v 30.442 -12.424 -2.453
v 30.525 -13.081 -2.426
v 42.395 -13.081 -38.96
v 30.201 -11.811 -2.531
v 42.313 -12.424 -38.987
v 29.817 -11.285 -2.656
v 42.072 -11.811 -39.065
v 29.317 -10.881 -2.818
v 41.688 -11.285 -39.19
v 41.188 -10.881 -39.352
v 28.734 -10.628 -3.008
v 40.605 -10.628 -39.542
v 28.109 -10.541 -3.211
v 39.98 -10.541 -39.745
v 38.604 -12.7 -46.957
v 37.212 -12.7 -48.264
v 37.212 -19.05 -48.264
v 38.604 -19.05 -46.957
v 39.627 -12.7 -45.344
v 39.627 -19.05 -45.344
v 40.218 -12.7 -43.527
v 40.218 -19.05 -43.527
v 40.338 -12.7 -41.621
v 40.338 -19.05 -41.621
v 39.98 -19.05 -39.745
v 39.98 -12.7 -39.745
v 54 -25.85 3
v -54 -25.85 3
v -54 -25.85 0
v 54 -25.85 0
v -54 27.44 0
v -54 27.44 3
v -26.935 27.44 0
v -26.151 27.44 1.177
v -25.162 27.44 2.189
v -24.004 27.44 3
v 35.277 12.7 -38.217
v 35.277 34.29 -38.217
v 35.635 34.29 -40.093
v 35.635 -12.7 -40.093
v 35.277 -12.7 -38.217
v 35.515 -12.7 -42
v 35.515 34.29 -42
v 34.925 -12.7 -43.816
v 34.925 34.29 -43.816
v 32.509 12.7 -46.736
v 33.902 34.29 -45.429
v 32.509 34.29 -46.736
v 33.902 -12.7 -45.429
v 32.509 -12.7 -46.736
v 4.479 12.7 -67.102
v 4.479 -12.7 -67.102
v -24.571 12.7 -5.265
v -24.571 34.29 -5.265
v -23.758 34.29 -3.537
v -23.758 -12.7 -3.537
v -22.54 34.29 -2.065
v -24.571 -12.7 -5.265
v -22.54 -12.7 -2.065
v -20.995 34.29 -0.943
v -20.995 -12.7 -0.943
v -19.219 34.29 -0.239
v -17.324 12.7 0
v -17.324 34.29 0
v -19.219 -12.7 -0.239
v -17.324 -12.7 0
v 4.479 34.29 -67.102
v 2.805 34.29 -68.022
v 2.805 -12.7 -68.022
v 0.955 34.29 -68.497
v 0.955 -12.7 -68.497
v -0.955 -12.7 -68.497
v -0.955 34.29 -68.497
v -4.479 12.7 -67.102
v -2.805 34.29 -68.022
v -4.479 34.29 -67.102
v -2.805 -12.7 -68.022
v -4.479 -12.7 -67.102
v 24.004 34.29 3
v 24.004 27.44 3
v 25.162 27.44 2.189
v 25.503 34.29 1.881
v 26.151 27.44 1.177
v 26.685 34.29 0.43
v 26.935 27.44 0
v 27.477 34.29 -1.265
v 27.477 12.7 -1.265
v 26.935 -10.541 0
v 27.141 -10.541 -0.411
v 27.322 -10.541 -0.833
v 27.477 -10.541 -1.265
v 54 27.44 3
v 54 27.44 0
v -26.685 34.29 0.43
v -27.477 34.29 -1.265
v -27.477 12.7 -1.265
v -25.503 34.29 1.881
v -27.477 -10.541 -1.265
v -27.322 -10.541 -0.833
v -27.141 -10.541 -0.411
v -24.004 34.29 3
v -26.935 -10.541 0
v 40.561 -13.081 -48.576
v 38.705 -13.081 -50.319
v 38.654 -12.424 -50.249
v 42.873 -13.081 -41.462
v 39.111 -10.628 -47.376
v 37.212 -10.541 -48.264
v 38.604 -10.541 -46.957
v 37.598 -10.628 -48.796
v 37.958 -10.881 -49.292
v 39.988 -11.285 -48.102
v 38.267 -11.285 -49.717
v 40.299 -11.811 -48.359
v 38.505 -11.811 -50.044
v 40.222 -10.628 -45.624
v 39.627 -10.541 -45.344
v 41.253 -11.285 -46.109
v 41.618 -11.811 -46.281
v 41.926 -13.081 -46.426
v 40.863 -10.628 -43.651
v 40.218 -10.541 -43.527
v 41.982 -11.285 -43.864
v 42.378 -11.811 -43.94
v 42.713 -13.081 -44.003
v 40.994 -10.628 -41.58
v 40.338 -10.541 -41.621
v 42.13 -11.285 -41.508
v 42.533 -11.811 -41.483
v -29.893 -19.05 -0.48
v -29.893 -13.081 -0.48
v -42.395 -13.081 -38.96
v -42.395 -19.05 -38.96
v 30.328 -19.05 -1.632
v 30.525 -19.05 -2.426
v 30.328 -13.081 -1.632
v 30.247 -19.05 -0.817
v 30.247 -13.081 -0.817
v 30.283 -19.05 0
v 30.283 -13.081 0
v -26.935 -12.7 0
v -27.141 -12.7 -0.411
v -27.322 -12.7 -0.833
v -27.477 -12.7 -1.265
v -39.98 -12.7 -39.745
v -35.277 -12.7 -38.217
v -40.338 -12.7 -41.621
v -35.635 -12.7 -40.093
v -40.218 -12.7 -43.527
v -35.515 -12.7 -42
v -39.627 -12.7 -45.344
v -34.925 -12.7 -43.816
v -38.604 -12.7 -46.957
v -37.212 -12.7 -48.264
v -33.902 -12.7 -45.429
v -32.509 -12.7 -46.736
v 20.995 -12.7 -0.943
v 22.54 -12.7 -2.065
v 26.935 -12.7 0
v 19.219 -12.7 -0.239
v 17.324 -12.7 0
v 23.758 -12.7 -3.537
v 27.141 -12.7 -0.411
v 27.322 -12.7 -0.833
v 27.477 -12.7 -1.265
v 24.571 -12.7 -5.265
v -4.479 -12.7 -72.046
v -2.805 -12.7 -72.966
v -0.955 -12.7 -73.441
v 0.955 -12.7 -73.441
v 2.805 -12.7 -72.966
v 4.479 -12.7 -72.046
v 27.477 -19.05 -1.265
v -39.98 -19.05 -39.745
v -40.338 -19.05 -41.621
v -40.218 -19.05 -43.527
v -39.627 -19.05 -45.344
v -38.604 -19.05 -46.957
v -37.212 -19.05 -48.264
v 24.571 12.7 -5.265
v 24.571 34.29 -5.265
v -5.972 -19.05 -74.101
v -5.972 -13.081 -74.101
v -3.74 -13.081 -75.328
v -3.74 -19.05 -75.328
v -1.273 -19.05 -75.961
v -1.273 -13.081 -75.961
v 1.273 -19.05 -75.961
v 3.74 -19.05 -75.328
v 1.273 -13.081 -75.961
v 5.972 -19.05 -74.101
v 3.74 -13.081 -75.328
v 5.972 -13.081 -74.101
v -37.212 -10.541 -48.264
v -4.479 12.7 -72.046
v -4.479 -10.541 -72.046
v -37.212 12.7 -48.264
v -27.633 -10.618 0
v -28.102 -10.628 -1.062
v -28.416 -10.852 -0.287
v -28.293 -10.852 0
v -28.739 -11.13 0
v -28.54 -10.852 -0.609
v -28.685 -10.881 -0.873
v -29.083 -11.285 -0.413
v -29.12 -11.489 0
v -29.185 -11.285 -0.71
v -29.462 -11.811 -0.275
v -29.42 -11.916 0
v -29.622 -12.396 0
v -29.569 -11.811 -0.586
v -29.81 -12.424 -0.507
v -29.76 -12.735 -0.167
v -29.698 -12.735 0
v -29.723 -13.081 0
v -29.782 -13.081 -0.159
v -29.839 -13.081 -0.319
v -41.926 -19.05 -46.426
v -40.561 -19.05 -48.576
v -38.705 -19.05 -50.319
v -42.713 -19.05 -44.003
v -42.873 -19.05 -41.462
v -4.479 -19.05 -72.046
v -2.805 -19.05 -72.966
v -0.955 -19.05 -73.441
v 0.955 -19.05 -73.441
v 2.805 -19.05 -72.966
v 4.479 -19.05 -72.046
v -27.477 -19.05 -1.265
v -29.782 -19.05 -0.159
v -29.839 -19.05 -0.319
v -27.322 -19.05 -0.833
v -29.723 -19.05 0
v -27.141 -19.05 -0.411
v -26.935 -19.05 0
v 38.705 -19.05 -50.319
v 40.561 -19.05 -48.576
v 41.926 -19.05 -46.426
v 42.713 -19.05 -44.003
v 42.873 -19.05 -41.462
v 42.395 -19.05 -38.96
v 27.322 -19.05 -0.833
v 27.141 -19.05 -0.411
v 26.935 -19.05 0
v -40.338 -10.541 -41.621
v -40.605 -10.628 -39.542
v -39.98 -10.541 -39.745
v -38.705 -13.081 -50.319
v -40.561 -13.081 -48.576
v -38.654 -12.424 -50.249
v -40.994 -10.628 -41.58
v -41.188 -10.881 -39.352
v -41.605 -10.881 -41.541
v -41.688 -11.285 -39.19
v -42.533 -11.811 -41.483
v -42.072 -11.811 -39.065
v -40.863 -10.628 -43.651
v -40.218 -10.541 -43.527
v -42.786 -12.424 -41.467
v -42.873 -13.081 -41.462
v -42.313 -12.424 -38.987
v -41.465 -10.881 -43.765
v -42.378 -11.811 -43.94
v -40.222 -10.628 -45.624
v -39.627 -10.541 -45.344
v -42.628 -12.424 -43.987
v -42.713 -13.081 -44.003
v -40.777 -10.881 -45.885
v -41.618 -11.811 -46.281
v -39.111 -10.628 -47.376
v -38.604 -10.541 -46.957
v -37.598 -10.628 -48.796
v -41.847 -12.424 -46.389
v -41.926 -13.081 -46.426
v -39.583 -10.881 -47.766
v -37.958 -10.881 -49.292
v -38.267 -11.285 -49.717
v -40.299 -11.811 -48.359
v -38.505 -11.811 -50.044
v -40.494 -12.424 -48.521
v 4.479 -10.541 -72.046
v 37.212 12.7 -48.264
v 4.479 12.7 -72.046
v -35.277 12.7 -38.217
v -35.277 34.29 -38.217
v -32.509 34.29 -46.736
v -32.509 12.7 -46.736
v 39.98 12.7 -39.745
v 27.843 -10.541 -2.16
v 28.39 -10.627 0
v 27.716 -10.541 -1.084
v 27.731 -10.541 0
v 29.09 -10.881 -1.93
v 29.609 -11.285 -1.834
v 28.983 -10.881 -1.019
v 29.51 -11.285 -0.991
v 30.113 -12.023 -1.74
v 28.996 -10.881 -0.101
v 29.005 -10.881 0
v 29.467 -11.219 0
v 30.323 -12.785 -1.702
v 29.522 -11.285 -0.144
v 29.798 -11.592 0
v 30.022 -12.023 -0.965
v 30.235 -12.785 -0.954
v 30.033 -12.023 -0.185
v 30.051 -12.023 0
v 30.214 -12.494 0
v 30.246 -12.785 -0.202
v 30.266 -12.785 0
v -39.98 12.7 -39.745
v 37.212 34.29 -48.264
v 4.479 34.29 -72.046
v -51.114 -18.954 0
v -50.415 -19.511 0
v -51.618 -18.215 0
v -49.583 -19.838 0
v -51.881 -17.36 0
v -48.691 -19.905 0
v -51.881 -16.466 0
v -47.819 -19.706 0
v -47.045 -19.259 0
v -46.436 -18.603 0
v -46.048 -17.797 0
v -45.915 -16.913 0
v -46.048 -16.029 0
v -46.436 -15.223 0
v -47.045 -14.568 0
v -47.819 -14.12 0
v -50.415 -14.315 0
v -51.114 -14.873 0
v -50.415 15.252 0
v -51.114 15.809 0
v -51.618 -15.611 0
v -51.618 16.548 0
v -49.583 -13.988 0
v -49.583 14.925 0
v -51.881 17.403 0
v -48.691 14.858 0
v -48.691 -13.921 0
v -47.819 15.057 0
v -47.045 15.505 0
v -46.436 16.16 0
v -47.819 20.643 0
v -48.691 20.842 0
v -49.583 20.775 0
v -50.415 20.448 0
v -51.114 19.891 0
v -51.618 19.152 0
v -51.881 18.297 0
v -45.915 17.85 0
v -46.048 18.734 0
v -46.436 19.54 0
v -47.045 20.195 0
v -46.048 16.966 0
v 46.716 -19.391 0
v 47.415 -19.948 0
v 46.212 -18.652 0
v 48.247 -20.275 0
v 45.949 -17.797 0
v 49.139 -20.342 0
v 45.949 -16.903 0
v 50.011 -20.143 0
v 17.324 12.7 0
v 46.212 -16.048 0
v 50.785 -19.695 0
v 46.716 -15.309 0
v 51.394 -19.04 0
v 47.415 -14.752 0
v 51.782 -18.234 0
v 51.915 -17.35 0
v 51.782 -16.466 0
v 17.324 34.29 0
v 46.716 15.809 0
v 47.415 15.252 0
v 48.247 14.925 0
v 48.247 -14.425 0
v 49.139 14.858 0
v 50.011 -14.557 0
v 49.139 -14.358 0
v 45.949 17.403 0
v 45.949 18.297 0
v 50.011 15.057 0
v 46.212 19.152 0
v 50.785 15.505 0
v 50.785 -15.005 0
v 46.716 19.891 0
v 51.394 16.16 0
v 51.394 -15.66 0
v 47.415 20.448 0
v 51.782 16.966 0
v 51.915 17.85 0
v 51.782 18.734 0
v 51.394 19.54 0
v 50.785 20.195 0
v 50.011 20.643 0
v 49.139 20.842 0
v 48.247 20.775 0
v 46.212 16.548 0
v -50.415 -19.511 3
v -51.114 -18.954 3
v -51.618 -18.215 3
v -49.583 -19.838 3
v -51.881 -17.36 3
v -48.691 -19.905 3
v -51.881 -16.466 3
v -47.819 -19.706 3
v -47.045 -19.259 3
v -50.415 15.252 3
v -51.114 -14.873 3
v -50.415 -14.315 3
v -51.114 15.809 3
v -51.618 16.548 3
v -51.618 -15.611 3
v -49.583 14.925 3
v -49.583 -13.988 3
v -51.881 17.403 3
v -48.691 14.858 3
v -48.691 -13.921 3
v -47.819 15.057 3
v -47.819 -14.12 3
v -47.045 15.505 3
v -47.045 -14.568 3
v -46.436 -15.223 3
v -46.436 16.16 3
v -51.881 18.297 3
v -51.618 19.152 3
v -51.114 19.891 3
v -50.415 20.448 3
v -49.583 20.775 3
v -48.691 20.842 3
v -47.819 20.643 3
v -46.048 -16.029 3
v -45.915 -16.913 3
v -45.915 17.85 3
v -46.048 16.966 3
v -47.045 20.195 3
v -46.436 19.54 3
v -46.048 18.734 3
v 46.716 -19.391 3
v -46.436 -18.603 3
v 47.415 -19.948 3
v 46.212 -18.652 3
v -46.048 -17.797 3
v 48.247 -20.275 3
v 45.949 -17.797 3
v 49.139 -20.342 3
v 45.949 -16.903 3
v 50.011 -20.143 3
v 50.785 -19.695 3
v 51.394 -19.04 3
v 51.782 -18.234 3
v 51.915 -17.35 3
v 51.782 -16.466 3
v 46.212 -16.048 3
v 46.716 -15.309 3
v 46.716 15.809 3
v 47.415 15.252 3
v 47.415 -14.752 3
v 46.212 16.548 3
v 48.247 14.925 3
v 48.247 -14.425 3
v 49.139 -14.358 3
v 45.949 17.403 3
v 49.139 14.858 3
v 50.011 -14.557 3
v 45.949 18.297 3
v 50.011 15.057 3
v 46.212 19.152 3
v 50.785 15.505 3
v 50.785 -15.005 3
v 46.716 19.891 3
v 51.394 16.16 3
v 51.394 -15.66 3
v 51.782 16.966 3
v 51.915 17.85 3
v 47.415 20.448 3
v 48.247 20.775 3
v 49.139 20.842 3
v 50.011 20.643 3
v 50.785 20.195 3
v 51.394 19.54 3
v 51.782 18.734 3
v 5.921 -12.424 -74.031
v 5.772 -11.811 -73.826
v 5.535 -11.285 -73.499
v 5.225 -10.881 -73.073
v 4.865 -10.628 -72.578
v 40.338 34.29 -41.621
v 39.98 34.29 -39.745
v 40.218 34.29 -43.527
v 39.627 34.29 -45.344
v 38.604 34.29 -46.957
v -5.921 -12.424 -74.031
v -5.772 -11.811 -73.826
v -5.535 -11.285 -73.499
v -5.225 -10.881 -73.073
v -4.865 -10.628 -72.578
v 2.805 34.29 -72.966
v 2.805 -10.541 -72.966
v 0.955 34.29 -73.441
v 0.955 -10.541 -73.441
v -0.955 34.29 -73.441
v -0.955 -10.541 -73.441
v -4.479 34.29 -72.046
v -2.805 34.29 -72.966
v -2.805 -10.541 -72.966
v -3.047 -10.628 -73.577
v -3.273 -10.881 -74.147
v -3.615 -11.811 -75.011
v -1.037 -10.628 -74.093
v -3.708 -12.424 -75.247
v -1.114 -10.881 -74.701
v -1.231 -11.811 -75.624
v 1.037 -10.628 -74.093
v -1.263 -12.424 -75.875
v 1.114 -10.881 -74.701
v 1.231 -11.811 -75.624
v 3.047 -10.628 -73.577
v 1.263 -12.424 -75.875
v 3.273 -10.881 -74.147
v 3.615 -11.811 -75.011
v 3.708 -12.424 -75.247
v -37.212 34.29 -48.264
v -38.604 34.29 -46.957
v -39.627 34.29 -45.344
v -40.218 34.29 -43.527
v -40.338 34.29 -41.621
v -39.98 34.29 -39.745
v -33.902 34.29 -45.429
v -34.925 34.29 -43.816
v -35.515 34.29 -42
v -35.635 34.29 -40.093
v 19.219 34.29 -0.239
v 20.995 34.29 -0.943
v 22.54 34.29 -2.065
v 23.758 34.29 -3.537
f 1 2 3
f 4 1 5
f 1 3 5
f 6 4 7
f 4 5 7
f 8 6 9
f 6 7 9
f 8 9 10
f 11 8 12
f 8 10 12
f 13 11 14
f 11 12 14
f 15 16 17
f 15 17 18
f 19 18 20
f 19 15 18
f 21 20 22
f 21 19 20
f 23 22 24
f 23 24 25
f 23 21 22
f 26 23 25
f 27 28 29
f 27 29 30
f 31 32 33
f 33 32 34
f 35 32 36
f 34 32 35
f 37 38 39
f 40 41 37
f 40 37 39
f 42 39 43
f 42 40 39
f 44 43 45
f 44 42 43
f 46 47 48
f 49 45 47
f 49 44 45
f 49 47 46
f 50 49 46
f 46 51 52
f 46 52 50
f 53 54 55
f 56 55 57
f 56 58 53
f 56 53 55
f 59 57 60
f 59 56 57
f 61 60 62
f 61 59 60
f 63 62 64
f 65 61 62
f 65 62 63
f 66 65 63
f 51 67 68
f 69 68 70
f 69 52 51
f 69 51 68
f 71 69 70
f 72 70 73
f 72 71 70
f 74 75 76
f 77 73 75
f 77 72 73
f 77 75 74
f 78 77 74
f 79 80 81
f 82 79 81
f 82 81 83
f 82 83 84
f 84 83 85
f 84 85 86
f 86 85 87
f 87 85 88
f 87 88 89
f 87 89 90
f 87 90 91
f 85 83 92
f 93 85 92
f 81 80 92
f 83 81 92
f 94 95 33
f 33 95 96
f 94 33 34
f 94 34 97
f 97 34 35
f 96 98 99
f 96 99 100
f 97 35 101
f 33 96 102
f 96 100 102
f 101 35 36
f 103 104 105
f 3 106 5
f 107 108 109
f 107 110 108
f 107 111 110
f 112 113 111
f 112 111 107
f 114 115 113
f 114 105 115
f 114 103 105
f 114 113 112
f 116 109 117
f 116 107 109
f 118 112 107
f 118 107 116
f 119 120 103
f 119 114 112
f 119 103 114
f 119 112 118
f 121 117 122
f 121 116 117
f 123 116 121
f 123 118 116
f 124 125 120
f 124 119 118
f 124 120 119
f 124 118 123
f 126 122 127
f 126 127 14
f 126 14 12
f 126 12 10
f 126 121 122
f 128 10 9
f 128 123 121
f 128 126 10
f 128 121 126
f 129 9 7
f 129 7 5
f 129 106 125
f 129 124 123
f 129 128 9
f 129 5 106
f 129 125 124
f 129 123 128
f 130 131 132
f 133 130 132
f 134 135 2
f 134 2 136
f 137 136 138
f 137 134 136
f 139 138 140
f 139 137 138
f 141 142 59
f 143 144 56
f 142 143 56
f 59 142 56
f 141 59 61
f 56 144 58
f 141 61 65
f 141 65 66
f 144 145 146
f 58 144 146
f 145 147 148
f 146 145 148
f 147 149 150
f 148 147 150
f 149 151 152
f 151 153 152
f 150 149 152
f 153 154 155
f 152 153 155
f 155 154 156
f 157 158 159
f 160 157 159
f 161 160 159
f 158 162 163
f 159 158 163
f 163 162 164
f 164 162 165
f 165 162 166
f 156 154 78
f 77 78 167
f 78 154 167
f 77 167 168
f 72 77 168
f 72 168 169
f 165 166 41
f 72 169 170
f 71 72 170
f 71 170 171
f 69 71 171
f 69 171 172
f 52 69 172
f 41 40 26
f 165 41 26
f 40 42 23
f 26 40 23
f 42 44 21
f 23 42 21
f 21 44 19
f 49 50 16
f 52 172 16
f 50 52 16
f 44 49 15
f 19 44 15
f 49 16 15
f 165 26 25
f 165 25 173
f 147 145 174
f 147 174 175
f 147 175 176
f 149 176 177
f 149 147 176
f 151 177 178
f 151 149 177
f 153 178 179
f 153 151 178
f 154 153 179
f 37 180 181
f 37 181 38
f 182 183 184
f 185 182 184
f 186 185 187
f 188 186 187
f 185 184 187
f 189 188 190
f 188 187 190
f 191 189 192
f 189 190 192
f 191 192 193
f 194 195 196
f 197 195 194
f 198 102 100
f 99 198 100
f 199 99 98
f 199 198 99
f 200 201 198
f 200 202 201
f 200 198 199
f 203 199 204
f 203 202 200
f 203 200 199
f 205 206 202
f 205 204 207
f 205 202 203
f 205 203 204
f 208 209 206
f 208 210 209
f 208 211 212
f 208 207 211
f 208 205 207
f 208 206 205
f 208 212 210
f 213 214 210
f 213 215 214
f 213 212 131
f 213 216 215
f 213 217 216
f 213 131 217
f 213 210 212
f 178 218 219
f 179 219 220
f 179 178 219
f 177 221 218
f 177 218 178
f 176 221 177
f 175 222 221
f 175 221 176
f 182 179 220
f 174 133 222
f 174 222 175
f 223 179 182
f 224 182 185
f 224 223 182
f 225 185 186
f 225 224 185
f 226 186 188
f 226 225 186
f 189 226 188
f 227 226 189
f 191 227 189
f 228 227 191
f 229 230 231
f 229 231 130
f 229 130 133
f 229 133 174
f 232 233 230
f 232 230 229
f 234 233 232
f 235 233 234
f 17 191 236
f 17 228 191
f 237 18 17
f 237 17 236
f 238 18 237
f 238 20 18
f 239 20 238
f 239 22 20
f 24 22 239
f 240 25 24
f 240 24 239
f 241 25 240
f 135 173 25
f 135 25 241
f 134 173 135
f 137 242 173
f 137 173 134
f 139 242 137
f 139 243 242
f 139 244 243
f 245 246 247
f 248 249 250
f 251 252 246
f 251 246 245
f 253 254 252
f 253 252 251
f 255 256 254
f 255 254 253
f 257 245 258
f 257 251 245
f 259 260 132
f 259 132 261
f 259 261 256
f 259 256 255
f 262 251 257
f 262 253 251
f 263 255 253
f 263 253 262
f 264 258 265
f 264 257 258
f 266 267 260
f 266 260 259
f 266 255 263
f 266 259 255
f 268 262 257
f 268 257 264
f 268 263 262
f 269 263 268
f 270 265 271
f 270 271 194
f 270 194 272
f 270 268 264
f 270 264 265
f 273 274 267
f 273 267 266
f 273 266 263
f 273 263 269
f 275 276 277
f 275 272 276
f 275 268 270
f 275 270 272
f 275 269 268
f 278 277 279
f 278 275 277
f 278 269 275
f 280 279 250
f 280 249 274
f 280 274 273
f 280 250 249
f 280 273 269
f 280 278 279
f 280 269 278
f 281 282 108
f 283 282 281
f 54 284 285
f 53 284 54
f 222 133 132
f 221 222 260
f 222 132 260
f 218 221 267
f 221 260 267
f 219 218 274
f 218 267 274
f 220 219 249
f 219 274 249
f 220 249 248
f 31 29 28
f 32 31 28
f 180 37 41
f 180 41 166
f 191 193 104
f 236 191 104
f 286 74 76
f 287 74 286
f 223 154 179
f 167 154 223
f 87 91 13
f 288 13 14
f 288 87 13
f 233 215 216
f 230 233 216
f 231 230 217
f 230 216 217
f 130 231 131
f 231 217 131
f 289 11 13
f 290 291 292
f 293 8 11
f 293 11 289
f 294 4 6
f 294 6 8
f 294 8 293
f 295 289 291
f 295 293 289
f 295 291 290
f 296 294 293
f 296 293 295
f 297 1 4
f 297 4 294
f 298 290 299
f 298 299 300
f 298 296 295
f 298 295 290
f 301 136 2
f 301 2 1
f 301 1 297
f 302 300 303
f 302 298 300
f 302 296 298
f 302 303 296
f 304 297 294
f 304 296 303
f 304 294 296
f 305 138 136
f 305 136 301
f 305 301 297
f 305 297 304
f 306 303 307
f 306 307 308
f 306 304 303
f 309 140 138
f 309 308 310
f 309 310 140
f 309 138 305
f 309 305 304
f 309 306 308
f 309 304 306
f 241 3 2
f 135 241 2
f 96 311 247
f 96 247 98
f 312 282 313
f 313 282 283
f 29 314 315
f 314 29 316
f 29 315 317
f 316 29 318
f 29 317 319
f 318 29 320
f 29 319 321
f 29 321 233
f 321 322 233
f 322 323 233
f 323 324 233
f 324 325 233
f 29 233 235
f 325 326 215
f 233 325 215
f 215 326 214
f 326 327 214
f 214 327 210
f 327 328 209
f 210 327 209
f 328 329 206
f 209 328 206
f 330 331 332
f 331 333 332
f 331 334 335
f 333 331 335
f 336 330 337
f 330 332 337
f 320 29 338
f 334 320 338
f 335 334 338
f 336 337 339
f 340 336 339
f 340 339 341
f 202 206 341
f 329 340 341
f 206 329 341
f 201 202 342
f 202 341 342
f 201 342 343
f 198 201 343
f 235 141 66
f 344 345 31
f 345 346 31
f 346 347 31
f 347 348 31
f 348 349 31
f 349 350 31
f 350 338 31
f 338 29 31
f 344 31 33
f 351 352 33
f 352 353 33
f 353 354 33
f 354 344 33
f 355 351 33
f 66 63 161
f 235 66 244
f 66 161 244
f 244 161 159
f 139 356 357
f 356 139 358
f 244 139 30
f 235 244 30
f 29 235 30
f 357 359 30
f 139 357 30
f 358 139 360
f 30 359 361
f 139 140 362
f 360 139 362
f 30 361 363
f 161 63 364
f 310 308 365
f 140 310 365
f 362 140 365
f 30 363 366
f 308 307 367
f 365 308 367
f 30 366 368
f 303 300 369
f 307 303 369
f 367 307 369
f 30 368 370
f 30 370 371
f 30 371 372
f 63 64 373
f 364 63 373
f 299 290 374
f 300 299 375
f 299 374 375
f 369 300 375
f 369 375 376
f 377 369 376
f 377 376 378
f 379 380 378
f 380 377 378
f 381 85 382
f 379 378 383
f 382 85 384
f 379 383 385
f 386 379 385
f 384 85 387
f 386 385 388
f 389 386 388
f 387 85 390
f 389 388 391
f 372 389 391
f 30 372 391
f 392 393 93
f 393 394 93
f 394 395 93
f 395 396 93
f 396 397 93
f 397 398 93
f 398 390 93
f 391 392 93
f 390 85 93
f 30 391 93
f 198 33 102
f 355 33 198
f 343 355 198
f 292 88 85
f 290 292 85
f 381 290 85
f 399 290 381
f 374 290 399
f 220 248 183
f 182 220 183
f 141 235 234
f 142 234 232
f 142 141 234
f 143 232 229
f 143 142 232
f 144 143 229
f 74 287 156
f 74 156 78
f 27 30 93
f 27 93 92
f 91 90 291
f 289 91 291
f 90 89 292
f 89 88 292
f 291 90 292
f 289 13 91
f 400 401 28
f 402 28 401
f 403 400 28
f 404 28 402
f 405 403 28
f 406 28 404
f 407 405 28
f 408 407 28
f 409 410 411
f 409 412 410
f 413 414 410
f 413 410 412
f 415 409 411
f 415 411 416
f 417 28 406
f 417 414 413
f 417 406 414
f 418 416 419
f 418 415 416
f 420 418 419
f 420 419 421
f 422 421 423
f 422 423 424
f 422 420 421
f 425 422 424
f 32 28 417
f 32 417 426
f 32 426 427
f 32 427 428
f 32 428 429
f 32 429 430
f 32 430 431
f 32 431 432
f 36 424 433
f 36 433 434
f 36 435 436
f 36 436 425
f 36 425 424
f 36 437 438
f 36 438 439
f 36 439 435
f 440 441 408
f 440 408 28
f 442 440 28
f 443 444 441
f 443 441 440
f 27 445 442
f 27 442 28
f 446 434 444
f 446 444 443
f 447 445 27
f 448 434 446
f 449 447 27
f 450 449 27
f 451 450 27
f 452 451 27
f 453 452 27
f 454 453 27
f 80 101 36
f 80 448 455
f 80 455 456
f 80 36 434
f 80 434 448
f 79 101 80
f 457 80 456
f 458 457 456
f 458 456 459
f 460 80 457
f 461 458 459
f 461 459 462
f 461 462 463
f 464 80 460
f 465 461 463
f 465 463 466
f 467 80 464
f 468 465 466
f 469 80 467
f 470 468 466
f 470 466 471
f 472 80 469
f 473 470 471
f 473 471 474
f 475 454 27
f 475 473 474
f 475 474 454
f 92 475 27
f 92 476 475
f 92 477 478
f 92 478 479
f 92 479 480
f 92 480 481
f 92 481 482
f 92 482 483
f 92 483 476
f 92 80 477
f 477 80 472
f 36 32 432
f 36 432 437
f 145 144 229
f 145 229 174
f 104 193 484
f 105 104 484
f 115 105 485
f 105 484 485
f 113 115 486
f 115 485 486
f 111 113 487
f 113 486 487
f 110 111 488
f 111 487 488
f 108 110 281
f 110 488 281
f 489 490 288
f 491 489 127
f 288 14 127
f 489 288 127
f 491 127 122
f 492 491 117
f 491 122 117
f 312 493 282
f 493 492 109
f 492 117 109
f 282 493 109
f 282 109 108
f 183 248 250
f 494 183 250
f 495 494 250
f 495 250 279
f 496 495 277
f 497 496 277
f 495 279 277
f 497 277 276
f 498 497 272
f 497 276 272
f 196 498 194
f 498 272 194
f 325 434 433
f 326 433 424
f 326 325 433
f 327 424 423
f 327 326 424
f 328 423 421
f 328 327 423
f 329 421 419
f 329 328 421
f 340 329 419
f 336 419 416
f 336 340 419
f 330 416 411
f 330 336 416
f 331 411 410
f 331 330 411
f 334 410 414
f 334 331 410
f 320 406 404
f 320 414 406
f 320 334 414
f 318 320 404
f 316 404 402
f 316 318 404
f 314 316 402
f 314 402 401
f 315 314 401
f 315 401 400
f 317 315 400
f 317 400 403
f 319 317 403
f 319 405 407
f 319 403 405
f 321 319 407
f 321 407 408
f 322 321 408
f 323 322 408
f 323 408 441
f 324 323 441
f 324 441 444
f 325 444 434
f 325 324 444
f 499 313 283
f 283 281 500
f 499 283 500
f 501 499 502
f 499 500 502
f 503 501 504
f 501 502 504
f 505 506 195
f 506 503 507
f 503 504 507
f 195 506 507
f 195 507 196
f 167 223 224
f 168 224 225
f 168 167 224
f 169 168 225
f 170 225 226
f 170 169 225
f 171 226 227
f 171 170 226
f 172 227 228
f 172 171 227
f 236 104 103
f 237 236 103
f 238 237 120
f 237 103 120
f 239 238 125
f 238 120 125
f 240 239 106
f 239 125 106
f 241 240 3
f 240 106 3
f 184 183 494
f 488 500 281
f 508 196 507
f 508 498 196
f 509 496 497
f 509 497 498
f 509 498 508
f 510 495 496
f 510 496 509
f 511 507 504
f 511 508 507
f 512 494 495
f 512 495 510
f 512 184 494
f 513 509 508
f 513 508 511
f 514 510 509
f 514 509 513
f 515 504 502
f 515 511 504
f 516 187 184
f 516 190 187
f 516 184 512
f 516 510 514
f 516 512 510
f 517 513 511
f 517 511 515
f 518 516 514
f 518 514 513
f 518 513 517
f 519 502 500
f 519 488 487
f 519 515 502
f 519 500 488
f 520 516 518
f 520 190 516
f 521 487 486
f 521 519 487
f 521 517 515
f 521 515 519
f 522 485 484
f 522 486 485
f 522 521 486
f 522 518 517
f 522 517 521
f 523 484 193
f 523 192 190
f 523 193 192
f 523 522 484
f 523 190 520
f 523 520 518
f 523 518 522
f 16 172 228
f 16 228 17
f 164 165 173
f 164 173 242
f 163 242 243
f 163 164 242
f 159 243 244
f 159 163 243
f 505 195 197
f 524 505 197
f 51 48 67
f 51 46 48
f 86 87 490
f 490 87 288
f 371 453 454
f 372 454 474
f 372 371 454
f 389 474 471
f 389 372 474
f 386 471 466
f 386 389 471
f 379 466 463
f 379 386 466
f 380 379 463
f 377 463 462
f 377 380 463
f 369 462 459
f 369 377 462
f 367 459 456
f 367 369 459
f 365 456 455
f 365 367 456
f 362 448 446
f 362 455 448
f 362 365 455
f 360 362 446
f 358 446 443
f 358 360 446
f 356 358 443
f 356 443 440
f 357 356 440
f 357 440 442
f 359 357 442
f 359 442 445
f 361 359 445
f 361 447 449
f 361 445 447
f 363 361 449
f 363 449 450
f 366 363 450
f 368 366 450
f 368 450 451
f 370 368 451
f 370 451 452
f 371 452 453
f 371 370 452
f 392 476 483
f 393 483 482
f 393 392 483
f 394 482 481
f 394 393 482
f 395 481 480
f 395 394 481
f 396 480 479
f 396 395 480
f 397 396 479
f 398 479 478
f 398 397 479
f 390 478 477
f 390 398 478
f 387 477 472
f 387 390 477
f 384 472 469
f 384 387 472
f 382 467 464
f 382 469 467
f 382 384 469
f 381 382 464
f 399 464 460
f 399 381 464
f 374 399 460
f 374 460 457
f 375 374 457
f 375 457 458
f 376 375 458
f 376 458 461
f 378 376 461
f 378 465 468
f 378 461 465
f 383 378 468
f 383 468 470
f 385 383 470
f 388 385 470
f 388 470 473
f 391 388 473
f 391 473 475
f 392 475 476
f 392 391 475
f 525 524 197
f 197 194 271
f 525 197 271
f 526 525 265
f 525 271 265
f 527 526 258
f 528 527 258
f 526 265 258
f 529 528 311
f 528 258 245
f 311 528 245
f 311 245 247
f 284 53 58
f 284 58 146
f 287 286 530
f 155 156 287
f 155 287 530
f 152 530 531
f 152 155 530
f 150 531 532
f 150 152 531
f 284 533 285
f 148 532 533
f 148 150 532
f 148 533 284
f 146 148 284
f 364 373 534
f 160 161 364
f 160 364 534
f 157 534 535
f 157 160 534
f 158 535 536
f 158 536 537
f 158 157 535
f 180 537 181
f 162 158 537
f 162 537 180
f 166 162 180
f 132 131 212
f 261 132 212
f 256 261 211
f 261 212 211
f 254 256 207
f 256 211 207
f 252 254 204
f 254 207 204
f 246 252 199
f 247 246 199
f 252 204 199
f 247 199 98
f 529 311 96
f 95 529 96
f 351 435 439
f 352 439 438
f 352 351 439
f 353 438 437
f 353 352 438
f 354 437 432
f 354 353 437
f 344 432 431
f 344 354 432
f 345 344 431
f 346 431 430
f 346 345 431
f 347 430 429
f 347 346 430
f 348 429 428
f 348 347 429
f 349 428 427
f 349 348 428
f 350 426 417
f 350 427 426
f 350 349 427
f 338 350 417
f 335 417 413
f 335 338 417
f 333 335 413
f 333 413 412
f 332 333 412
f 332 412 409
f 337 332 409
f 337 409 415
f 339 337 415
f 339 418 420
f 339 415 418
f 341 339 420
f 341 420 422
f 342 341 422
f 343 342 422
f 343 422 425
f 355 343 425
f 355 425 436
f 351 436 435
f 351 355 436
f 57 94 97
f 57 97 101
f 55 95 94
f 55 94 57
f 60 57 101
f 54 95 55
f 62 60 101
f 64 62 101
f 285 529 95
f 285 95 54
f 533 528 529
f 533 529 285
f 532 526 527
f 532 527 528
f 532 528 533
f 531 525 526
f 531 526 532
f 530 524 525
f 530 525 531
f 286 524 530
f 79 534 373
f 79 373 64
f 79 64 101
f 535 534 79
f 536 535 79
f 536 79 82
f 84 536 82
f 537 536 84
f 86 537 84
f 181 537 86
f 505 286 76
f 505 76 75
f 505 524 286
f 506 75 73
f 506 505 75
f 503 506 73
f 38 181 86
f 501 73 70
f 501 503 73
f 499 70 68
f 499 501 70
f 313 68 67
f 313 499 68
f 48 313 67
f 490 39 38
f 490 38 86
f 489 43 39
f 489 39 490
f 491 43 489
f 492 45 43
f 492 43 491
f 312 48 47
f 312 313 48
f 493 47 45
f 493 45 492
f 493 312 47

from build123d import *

# Parameters (mm, degrees)
SKETCH1_W                = 45.72
SKETCH1_H                = 25.4
BOSS_EXTRUDE1_DEPTH      = 4
BOSS_EXTRUDE2_DEPTH      = 25.4
FILLET1_R                = 7.62
BOSS_EXTRUDE3_DEPTH      = 5.08
BOSS_EXTRUDE4_DEPTH      = 6.35
BOSS_EXTRUDE4_DEPTH_BACK = 2.159
BOSS_EXTRUDE5_START      = -8.509
BOSS_EXTRUDE5_DEPTH      = 8.509
CUT_EXTRUDE4_DEPTH       = 12.192
FILLET5_R                = 5.715
FILLET6_R                = 2.54
BOSS_EXTRUDE6_DEPTH      = 16.51
BOSS_EXTRUDE7_START      = -40.14
SKETCH23_W               = 108
SKETCH23_H               = 3
BOSS_EXTRUDE7_DEPTH      = 46.49
CUT_EXTRUDE10_DEPTH      = 105.433406107
CUT_EXTRUDE10_DEPTH_BACK = 105.433406107
SKETCH24_W               = 66.644686686
SKETCH24_H               = 9.540314428
SKETCH27_W               = 108
SKETCH27_H               = 3
BOSS_EXTRUDE9_DEPTH      = 6.8
CUT_EXTRUDE11_DEPTH      = 102.682486179
CUT_EXTRUDE11_DEPTH_BACK = 3
SKETCH28_R               = 3


with BuildPart() as part:
    # Sketch1 → Boss-Extrude1 (new body)
    with BuildSketch(Plane.XY):
        Rectangle(SKETCH1_W, SKETCH1_H)
    extrude(amount=BOSS_EXTRUDE1_DEPTH)

    # Sketch2 → Boss-Extrude2 (add)
    with BuildSketch(Plane(origin=(0, 12.7, 0), x_dir=(1, 0, 0), z_dir=(0, 1, 0))):
        Polygon((36.988256983, 43.482303925), (22.86, 0), (22.86, -4), (25.766170112, -4), (41.690539001, 45.01016797), (0, 75.30011757), (-41.690539001, 45.01016797), (-25.766170112, -4), (-22.86, -4), (-22.86, 0), (-36.988256983, 43.482303925), (0, 70.35584566), align=None)
    extrude(amount=-BOSS_EXTRUDE2_DEPTH)

    # Fillet1
    fillet1_edges = [part.edges().sort_by_distance(p)[0] for p in [
        (0, 0, -75.30011757),
        (41.690539001, 0, -45.01016797),
        (25.766170112, 0, 4),
        (36.988256983, 0, -43.482303925),
        (0, 0, -70.35584566),
        (-36.988256983, 0, -43.482303925),
        (-25.766170112, 0, 4),
        (-41.690539001, 0, -45.01016797),
        (-22.86, 0, 0),
        (22.86, 0, 0),
    ]]
    fillet(fillet1_edges, radius=FILLET1_R)

    # Sketch6 → Boss-Extrude3 (add)
    with BuildSketch(Plane(origin=(0, 12.7, 0), x_dir=(1, 0, 0), z_dir=(0, 1, 0))):
        with BuildLine():
            Line((-20.229916049, -4), (20.229916049, -4))
            ThreePointArc((20.229916049, -4), (24.708839671, -2.544709497), (27.476966703, 1.265290503))
            Line((27.476966703, 1.265290503), (39.97974241, 39.744877467))
            ThreePointArc((39.97974241, 39.744877467), (39.97974241, 44.454296461), (37.211615379, 48.264296461))
            Line((37.211615379, 48.264296461), (4.478923622, 72.045989078))
            ThreePointArc((4.478923622, 72.045989078), (0, 73.501279581), (-4.478923622, 72.045989078))
            Line((-4.478923622, 72.045989078), (-37.211615379, 48.264296461))
            ThreePointArc((-37.211615379, 48.264296461), (-39.97974241, 44.454296461), (-39.97974241, 39.744877467))
            Line((-39.97974241, 39.744877467), (-27.476966703, 1.265290503))
            ThreePointArc((-27.476966703, 1.265290503), (-24.708839671, -2.544709497), (-20.229916049, -4))
        make_face()
        with BuildLine():
            Line((24.570796591, 5.265290503), (35.277460392, 38.217013422))
            ThreePointArc((35.277460392, 38.217013422), (35.277460392, 42.926432416), (32.50933336, 46.736432416))
            Line((32.50933336, 46.736432416), (4.478923622, 67.101717168))
            ThreePointArc((4.478923622, 67.101717168), (0, 68.557007671), (-4.478923622, 67.101717168))
            Line((-4.478923622, 67.101717168), (-32.50933336, 46.736432416))
            ThreePointArc((-32.50933336, 46.736432416), (-35.277460392, 42.926432416), (-35.277460392, 38.217013422))
            Line((-35.277460392, 38.217013422), (-24.570796591, 5.265290503))
            ThreePointArc((-24.570796591, 5.265290503), (-21.802669559, 1.455290503), (-17.323745937, 0))
            Line((-17.323745937, 0), (17.323745937, 0))
            ThreePointArc((17.323745937, 0), (21.802669559, 1.455290503), (24.570796591, 5.265290503))
        make_face(mode=Mode.SUBTRACT)
    extrude(amount=BOSS_EXTRUDE3_DEPTH)

    # Sketch8 → Boss-Extrude4 (add, two sides: drawn at the far end of the back side and taken through both)
    with BuildSketch(Plane.XZ.offset(12.7).offset(-BOSS_EXTRUDE4_DEPTH_BACK)):
        with BuildLine():
            Line((5.971898163, -74.100892244), (38.70458992, -50.319199627))
            ThreePointArc((38.70458992, -50.319199627), (42.395425962, -45.239199627), (42.395425962, -38.959974301))
            Line((42.395425962, -38.959974301), (29.892650254, -0.480387337))
            ThreePointArc((29.892650254, -0.480387337), (26.201814212, 4.599612663), (20.229916049, 6.54))
            Line((20.229916049, 6.54), (-20.229916049, 6.54))
            ThreePointArc((-20.229916049, 6.54), (-26.201814212, 4.599612663), (-29.892650254, -0.480387337))
            Line((-29.892650254, -0.480387337), (-42.395425962, -38.959974301))
            ThreePointArc((-42.395425962, -38.959974301), (-42.395425962, -45.239199627), (-38.70458992, -50.319199627))
            Line((-38.70458992, -50.319199627), (-5.971898163, -74.100892244))
            ThreePointArc((-5.971898163, -74.100892244), (0, -76.041279581), (5.971898163, -74.100892244))
        make_face()
        with BuildLine():
            Line((39.97974241, -39.744877467), (27.476966703, -1.265290503))
            ThreePointArc((27.476966703, -1.265290503), (24.708839671, 2.544709497), (20.229916049, 4))
            Line((20.229916049, 4), (-20.229916049, 4))
            ThreePointArc((-20.229916049, 4), (-24.708839671, 2.544709497), (-27.476966703, -1.265290503))
            Line((-27.476966703, -1.265290503), (-39.97974241, -39.744877467))
            ThreePointArc((-39.97974241, -39.744877467), (-39.97974241, -44.454296461), (-37.211615379, -48.264296461))
            Line((-37.211615379, -48.264296461), (-4.478923622, -72.045989078))
            ThreePointArc((-4.478923622, -72.045989078), (0, -73.501279581), (4.478923622, -72.045989078))
            Line((4.478923622, -72.045989078), (37.211615379, -48.264296461))
            ThreePointArc((37.211615379, -48.264296461), (39.97974241, -44.454296461), (39.97974241, -39.744877467))
        make_face(mode=Mode.SUBTRACT)
    extrude(amount=BOSS_EXTRUDE4_DEPTH + BOSS_EXTRUDE4_DEPTH_BACK)

    # Sketch11 → Boss-Extrude5 (add)
    with BuildSketch(Plane.XZ.offset(19.05).offset(BOSS_EXTRUDE5_START)):
        with BuildLine():
            Line((19.948787859, 5.414930333), (27.190045273, 1.56775587))
            Line((27.190045273, 1.56775587), (29.892650254, -0.480387337))
            ThreePointArc((29.892650254, -0.480387337), (26.201814212, 4.599612663), (20.229916049, 6.54))
            Line((20.229916049, 6.54), (19.948787859, 5.414930333))
        make_face()
        with BuildLine():
            ThreePointArc((20.229916049, 6.54), (28.196740294, 7.345392854), (29.892650254, -0.480387337))
            ThreePointArc((29.892650254, -0.480387337), (26.201814212, 4.599612663), (20.229916049, 6.54))
        make_face()
    extrude(amount=BOSS_EXTRUDE5_DEPTH)

    # Sketch12 → Cut-Extrude4 (cut)
    with BuildSketch(Plane.XZ.offset(19.05)):
        with BuildLine():
            ThreePointArc((28.787792432, 0.145862767), (27.450253023, 6.317941272), (21.166935135, 5.682739694))
            ThreePointArc((21.166935135, 5.682739694), (25.637505825, 3.822908801), (28.787792432, 0.145862767))
        make_face()
    extrude(amount=-CUT_EXTRUDE4_DEPTH, mode=Mode.SUBTRACT)

    # Fillet5
    fillet5_edges = [part.edges().sort_by_distance(p)[0] for p in [
        (20.229916049, -14.7955, 6.54),
        (29.892650254, -14.7955, -0.480387337),
    ]]
    fillet(fillet5_edges, radius=FILLET5_R)

    # Fillet6
    # the kernel refuses this fillet: 2.54 mm, written as the material it takes off along each edge
    with BuildSketch(Plane(origin=(32.732691756, -10.541, -42.099586964), x_dir=(0.5877852522924727, 0, -0.8090169943749478), z_dir=(-0.8090169943749478, 0, -0.5877852522924727))) as fillet6_piece_1:
        with BuildLine():
            CenterArc((10.16 - FILLET6_R, FILLET6_R), FILLET6_R, 270, 90)
            Line((10.16 - FILLET6_R, 0), (10.16, 0))
            Line((10.16, 0), (10.16, FILLET6_R))
        make_face()
    revolve(axis=Axis((32.732691756, -10.541, -42.099586964), (0, -1, 0)), revolution_arc=72, mode=Mode.SUBTRACT)
    with BuildSketch(Plane(origin=(5.971898163, -10.541, -74.100892244), x_dir=(0, -1, 0), z_dir=(0.8090169943749487, 0, 0.5877852522924716)), Plane(origin=(-38.70458992, -10.541, -50.319199627), x_dir=(0, -1, 0), z_dir=(0.8090169943749469, 0, -0.5877852522924739)), Plane(origin=(-29.892650254, -10.541, -0.480387337), x_dir=(0, -1, 0), z_dir=(-0.30901699437495056, 0, -0.9510565162951526))) as fillet6_piece_2:
        with BuildLine():
            CenterArc((FILLET6_R, -FILLET6_R), FILLET6_R, 90, 90)
            Line((0, -FILLET6_R), (0, 0))
            Line((0, 0), (FILLET6_R, 0))
        make_face()
    extrude(amount=40.459832097, mode=Mode.SUBTRACT)
    with BuildSketch(Plane(origin=(0, -10.541, -65.881279581), x_dir=(-0.5877852522924719, 0, -0.8090169943749482), z_dir=(-0.8090169943749482, 0, 0.5877852522924719))) as fillet6_piece_3:
        with BuildLine():
            CenterArc((10.16 - FILLET6_R, FILLET6_R), FILLET6_R, 270, 90)
            Line((10.16 - FILLET6_R, 0), (10.16, 0))
            Line((10.16, 0), (10.16, FILLET6_R))
        make_face()
    revolve(axis=Axis((0, -10.541, -65.881279581), (0, -1, 0)), revolution_arc=72, mode=Mode.SUBTRACT)
    with BuildSketch(Plane(origin=(-32.732691756, -10.541, -42.099586964), x_dir=(-0.9510565162951528, 0, 0.3090169943749496), z_dir=(0.3090169943749496, 0, 0.9510565162951528))) as fillet6_piece_4:
        with BuildLine():
            CenterArc((10.16 - FILLET6_R, FILLET6_R), FILLET6_R, 270, 90)
            Line((10.16 - FILLET6_R, 0), (10.16, 0))
            Line((10.16, 0), (10.16, FILLET6_R))
        make_face()
    revolve(axis=Axis((-32.732691756, -10.541, -42.099586964), (0, -1, 0)), revolution_arc=72, mode=Mode.SUBTRACT)
    with BuildSketch(Plane(origin=(-20.229916049, -10.541, -3.62), x_dir=(0, 0, 1), z_dir=(1, 0, 0))) as fillet6_piece_5:
        with BuildLine():
            CenterArc((10.16 - FILLET6_R, FILLET6_R), FILLET6_R, 270, 90)
            Line((10.16 - FILLET6_R, 0), (10.16, 0))
            Line((10.16, 0), (10.16, FILLET6_R))
        make_face()
    revolve(axis=Axis((-20.229916049, -10.541, -3.62), (0, -1, 0)), revolution_arc=72, mode=Mode.SUBTRACT)
    with BuildSketch(Plane(origin=(18.184374257, -10.541, 6.54), x_dir=(0, -1, 0), z_dir=(-1, 0, 0)), Plane(origin=(42.395425962, -10.541, -38.959974301), x_dir=(0, -1, 0), z_dir=(-0.30901699437494484, 0, 0.9510565162951544))) as fillet6_piece_6:
        with BuildLine():
            CenterArc((FILLET6_R, -FILLET6_R), FILLET6_R, 90, 90)
            Line((0, -FILLET6_R), (0, 0))
            Line((0, 0), (FILLET6_R, 0))
        make_face()
    extrude(amount=38.414290306, mode=Mode.SUBTRACT)
    with BuildSketch(Plane(origin=(18.184374257, -10.541, 12.255), x_dir=(0.5526465683039506, 0, -0.8334157249187628), z_dir=(0.8334157249187628, 0, 0.5526465683039506))) as fillet6_piece_7:
        with BuildLine():
            CenterArc((5.715 + FILLET6_R, -FILLET6_R), FILLET6_R, 90, 90)
            Line((5.715 + FILLET6_R, 0), (5.715, 0))
            Line((5.715, 0), (5.715, -FILLET6_R))
        make_face()
    revolve(axis=Axis((18.184374257, -10.541, 12.255), (0, 1, 0)), revolution_arc=33.548768752, mode=Mode.SUBTRACT)
    with BuildSketch(Plane(origin=(35.960045421, -10.541, -0.659781065), x_dir=(-0.9510565162951543, 0, -0.30901699437494495), z_dir=(0.30901699437494495, 0, -0.9510565162951543))) as fillet6_piece_8:
        with BuildLine():
            CenterArc((5.715 + FILLET6_R, -FILLET6_R), FILLET6_R, 90, 90)
            Line((5.715 + FILLET6_R, 0), (5.715, 0))
            Line((5.715, 0), (5.715, -FILLET6_R))
        make_face()
    revolve(axis=Axis((35.960045421, -10.541, -0.659781065), (0, 1, 0)), revolution_arc=33.548768752, mode=Mode.SUBTRACT)
    with BuildSketch(Plane(origin=(24.664153166, -10.541, 2.483203799), x_dir=(-0.5526465683039513, 0, 0.8334157249187624), z_dir=(-0.8334157249187624, 0, -0.5526465683039513))) as fillet6_piece_9:
        with BuildLine():
            CenterArc((6.009996192 - FILLET6_R, -FILLET6_R), FILLET6_R, 0, 90)
            Line((6.009996192 - FILLET6_R, 0), (6.009996192, 0))
            Line((6.009996192, 0), (6.009996192, -FILLET6_R))
        make_face()
    revolve(axis=Axis((24.664153166, -10.541, 2.483203799), (0, 1, 0)), revolution_arc=139.097537505, mode=Mode.SUBTRACT)

    # Sketch15 → Boss-Extrude6 (add)
    with BuildSketch(Plane(origin=(0, 17.78, 0), x_dir=(1, 0, 0), z_dir=(0, 1, 0))):
        with BuildLine():
            Line((-20.229916049, -4), (20.229916049, -4))
            ThreePointArc((20.229916049, -4), (24.708839671, -2.544709497), (27.476966703, 1.265290503))
            Line((27.476966703, 1.265290503), (39.97974241, 39.744877467))
            ThreePointArc((39.97974241, 39.744877467), (39.97974241, 44.454296461), (37.211615379, 48.264296461))
            Line((37.211615379, 48.264296461), (4.478923622, 72.045989078))
            ThreePointArc((4.478923622, 72.045989078), (0, 73.501279581), (-4.478923622, 72.045989078))
            Line((-4.478923622, 72.045989078), (-37.211615379, 48.264296461))
            ThreePointArc((-37.211615379, 48.264296461), (-39.97974241, 44.454296461), (-39.97974241, 39.744877467))
            Line((-39.97974241, 39.744877467), (-27.476966703, 1.265290503))
            ThreePointArc((-27.476966703, 1.265290503), (-24.708839671, -2.544709497), (-20.229916049, -4))
        make_face()
        with BuildLine():
            Line((32.50933336, 46.736432416), (4.478923622, 67.101717168))
            ThreePointArc((4.478923622, 67.101717168), (0, 68.557007671), (-4.478923622, 67.101717168))
            Line((-4.478923622, 67.101717168), (-32.50933336, 46.736432416))
            ThreePointArc((-32.50933336, 46.736432416), (-35.277460392, 42.926432416), (-35.277460392, 38.217013422))
            Line((-35.277460392, 38.217013422), (-24.570796591, 5.265290503))
            ThreePointArc((-24.570796591, 5.265290503), (-21.802669559, 1.455290503), (-17.323745937, 0))
            Line((-17.323745937, 0), (17.323745937, 0))
            ThreePointArc((17.323745937, 0), (21.802669559, 1.455290503), (24.570796591, 5.265290503))
            Line((24.570796591, 5.265290503), (35.277460392, 38.217013422))
            ThreePointArc((35.277460392, 38.217013422), (35.277460392, 42.926432416), (32.50933336, 46.736432416))
        make_face(mode=Mode.SUBTRACT)
    extrude(amount=BOSS_EXTRUDE6_DEPTH)

    # Sketch23 → Boss-Extrude7 (add)
    with BuildSketch(Plane.XZ.offset(12.7).offset(BOSS_EXTRUDE7_START)):
        with Locations((0, 1.5)):
            Rectangle(SKETCH23_W, SKETCH23_H)
    extrude(amount=BOSS_EXTRUDE7_DEPTH)

    # Sketch24 → Cut-Extrude10 (cut, two sides: drawn at the far end of the back side and taken through both)
    with BuildSketch(Plane.XZ.offset(12.7).offset(-CUT_EXTRUDE10_DEPTH_BACK)):
        with Locations((1.37764771, 7.770157214)):
            Rectangle(SKETCH24_W, SKETCH24_H)
    extrude(amount=CUT_EXTRUDE10_DEPTH + CUT_EXTRUDE10_DEPTH_BACK, mode=Mode.SUBTRACT)

    # Sketch27 → Boss-Extrude9 (add)
    with BuildSketch(Plane.XZ.offset(19.05)):
        with Locations((0, 1.5)):
            Rectangle(SKETCH27_W, SKETCH27_H)
    extrude(amount=BOSS_EXTRUDE9_DEPTH)

    # Sketch28 → Cut-Extrude11 (cut, two sides: drawn at the far end of the back side and taken through both)
    with BuildSketch(Plane.XY.offset(3).offset(-CUT_EXTRUDE11_DEPTH_BACK)):
        with Locations((48.915, -17.35)):
            Circle(SKETCH28_R)
        with Locations((48.915, 17.85)):
            Circle(SKETCH28_R)
        with Locations((-48.915, -16.913045034)):
            Circle(SKETCH28_R)
        with Locations((-48.915, 17.85)):
            Circle(SKETCH28_R)
    extrude(amount=CUT_EXTRUDE11_DEPTH + CUT_EXTRUDE11_DEPTH_BACK, mode=Mode.SUBTRACT)


solid = part.part
